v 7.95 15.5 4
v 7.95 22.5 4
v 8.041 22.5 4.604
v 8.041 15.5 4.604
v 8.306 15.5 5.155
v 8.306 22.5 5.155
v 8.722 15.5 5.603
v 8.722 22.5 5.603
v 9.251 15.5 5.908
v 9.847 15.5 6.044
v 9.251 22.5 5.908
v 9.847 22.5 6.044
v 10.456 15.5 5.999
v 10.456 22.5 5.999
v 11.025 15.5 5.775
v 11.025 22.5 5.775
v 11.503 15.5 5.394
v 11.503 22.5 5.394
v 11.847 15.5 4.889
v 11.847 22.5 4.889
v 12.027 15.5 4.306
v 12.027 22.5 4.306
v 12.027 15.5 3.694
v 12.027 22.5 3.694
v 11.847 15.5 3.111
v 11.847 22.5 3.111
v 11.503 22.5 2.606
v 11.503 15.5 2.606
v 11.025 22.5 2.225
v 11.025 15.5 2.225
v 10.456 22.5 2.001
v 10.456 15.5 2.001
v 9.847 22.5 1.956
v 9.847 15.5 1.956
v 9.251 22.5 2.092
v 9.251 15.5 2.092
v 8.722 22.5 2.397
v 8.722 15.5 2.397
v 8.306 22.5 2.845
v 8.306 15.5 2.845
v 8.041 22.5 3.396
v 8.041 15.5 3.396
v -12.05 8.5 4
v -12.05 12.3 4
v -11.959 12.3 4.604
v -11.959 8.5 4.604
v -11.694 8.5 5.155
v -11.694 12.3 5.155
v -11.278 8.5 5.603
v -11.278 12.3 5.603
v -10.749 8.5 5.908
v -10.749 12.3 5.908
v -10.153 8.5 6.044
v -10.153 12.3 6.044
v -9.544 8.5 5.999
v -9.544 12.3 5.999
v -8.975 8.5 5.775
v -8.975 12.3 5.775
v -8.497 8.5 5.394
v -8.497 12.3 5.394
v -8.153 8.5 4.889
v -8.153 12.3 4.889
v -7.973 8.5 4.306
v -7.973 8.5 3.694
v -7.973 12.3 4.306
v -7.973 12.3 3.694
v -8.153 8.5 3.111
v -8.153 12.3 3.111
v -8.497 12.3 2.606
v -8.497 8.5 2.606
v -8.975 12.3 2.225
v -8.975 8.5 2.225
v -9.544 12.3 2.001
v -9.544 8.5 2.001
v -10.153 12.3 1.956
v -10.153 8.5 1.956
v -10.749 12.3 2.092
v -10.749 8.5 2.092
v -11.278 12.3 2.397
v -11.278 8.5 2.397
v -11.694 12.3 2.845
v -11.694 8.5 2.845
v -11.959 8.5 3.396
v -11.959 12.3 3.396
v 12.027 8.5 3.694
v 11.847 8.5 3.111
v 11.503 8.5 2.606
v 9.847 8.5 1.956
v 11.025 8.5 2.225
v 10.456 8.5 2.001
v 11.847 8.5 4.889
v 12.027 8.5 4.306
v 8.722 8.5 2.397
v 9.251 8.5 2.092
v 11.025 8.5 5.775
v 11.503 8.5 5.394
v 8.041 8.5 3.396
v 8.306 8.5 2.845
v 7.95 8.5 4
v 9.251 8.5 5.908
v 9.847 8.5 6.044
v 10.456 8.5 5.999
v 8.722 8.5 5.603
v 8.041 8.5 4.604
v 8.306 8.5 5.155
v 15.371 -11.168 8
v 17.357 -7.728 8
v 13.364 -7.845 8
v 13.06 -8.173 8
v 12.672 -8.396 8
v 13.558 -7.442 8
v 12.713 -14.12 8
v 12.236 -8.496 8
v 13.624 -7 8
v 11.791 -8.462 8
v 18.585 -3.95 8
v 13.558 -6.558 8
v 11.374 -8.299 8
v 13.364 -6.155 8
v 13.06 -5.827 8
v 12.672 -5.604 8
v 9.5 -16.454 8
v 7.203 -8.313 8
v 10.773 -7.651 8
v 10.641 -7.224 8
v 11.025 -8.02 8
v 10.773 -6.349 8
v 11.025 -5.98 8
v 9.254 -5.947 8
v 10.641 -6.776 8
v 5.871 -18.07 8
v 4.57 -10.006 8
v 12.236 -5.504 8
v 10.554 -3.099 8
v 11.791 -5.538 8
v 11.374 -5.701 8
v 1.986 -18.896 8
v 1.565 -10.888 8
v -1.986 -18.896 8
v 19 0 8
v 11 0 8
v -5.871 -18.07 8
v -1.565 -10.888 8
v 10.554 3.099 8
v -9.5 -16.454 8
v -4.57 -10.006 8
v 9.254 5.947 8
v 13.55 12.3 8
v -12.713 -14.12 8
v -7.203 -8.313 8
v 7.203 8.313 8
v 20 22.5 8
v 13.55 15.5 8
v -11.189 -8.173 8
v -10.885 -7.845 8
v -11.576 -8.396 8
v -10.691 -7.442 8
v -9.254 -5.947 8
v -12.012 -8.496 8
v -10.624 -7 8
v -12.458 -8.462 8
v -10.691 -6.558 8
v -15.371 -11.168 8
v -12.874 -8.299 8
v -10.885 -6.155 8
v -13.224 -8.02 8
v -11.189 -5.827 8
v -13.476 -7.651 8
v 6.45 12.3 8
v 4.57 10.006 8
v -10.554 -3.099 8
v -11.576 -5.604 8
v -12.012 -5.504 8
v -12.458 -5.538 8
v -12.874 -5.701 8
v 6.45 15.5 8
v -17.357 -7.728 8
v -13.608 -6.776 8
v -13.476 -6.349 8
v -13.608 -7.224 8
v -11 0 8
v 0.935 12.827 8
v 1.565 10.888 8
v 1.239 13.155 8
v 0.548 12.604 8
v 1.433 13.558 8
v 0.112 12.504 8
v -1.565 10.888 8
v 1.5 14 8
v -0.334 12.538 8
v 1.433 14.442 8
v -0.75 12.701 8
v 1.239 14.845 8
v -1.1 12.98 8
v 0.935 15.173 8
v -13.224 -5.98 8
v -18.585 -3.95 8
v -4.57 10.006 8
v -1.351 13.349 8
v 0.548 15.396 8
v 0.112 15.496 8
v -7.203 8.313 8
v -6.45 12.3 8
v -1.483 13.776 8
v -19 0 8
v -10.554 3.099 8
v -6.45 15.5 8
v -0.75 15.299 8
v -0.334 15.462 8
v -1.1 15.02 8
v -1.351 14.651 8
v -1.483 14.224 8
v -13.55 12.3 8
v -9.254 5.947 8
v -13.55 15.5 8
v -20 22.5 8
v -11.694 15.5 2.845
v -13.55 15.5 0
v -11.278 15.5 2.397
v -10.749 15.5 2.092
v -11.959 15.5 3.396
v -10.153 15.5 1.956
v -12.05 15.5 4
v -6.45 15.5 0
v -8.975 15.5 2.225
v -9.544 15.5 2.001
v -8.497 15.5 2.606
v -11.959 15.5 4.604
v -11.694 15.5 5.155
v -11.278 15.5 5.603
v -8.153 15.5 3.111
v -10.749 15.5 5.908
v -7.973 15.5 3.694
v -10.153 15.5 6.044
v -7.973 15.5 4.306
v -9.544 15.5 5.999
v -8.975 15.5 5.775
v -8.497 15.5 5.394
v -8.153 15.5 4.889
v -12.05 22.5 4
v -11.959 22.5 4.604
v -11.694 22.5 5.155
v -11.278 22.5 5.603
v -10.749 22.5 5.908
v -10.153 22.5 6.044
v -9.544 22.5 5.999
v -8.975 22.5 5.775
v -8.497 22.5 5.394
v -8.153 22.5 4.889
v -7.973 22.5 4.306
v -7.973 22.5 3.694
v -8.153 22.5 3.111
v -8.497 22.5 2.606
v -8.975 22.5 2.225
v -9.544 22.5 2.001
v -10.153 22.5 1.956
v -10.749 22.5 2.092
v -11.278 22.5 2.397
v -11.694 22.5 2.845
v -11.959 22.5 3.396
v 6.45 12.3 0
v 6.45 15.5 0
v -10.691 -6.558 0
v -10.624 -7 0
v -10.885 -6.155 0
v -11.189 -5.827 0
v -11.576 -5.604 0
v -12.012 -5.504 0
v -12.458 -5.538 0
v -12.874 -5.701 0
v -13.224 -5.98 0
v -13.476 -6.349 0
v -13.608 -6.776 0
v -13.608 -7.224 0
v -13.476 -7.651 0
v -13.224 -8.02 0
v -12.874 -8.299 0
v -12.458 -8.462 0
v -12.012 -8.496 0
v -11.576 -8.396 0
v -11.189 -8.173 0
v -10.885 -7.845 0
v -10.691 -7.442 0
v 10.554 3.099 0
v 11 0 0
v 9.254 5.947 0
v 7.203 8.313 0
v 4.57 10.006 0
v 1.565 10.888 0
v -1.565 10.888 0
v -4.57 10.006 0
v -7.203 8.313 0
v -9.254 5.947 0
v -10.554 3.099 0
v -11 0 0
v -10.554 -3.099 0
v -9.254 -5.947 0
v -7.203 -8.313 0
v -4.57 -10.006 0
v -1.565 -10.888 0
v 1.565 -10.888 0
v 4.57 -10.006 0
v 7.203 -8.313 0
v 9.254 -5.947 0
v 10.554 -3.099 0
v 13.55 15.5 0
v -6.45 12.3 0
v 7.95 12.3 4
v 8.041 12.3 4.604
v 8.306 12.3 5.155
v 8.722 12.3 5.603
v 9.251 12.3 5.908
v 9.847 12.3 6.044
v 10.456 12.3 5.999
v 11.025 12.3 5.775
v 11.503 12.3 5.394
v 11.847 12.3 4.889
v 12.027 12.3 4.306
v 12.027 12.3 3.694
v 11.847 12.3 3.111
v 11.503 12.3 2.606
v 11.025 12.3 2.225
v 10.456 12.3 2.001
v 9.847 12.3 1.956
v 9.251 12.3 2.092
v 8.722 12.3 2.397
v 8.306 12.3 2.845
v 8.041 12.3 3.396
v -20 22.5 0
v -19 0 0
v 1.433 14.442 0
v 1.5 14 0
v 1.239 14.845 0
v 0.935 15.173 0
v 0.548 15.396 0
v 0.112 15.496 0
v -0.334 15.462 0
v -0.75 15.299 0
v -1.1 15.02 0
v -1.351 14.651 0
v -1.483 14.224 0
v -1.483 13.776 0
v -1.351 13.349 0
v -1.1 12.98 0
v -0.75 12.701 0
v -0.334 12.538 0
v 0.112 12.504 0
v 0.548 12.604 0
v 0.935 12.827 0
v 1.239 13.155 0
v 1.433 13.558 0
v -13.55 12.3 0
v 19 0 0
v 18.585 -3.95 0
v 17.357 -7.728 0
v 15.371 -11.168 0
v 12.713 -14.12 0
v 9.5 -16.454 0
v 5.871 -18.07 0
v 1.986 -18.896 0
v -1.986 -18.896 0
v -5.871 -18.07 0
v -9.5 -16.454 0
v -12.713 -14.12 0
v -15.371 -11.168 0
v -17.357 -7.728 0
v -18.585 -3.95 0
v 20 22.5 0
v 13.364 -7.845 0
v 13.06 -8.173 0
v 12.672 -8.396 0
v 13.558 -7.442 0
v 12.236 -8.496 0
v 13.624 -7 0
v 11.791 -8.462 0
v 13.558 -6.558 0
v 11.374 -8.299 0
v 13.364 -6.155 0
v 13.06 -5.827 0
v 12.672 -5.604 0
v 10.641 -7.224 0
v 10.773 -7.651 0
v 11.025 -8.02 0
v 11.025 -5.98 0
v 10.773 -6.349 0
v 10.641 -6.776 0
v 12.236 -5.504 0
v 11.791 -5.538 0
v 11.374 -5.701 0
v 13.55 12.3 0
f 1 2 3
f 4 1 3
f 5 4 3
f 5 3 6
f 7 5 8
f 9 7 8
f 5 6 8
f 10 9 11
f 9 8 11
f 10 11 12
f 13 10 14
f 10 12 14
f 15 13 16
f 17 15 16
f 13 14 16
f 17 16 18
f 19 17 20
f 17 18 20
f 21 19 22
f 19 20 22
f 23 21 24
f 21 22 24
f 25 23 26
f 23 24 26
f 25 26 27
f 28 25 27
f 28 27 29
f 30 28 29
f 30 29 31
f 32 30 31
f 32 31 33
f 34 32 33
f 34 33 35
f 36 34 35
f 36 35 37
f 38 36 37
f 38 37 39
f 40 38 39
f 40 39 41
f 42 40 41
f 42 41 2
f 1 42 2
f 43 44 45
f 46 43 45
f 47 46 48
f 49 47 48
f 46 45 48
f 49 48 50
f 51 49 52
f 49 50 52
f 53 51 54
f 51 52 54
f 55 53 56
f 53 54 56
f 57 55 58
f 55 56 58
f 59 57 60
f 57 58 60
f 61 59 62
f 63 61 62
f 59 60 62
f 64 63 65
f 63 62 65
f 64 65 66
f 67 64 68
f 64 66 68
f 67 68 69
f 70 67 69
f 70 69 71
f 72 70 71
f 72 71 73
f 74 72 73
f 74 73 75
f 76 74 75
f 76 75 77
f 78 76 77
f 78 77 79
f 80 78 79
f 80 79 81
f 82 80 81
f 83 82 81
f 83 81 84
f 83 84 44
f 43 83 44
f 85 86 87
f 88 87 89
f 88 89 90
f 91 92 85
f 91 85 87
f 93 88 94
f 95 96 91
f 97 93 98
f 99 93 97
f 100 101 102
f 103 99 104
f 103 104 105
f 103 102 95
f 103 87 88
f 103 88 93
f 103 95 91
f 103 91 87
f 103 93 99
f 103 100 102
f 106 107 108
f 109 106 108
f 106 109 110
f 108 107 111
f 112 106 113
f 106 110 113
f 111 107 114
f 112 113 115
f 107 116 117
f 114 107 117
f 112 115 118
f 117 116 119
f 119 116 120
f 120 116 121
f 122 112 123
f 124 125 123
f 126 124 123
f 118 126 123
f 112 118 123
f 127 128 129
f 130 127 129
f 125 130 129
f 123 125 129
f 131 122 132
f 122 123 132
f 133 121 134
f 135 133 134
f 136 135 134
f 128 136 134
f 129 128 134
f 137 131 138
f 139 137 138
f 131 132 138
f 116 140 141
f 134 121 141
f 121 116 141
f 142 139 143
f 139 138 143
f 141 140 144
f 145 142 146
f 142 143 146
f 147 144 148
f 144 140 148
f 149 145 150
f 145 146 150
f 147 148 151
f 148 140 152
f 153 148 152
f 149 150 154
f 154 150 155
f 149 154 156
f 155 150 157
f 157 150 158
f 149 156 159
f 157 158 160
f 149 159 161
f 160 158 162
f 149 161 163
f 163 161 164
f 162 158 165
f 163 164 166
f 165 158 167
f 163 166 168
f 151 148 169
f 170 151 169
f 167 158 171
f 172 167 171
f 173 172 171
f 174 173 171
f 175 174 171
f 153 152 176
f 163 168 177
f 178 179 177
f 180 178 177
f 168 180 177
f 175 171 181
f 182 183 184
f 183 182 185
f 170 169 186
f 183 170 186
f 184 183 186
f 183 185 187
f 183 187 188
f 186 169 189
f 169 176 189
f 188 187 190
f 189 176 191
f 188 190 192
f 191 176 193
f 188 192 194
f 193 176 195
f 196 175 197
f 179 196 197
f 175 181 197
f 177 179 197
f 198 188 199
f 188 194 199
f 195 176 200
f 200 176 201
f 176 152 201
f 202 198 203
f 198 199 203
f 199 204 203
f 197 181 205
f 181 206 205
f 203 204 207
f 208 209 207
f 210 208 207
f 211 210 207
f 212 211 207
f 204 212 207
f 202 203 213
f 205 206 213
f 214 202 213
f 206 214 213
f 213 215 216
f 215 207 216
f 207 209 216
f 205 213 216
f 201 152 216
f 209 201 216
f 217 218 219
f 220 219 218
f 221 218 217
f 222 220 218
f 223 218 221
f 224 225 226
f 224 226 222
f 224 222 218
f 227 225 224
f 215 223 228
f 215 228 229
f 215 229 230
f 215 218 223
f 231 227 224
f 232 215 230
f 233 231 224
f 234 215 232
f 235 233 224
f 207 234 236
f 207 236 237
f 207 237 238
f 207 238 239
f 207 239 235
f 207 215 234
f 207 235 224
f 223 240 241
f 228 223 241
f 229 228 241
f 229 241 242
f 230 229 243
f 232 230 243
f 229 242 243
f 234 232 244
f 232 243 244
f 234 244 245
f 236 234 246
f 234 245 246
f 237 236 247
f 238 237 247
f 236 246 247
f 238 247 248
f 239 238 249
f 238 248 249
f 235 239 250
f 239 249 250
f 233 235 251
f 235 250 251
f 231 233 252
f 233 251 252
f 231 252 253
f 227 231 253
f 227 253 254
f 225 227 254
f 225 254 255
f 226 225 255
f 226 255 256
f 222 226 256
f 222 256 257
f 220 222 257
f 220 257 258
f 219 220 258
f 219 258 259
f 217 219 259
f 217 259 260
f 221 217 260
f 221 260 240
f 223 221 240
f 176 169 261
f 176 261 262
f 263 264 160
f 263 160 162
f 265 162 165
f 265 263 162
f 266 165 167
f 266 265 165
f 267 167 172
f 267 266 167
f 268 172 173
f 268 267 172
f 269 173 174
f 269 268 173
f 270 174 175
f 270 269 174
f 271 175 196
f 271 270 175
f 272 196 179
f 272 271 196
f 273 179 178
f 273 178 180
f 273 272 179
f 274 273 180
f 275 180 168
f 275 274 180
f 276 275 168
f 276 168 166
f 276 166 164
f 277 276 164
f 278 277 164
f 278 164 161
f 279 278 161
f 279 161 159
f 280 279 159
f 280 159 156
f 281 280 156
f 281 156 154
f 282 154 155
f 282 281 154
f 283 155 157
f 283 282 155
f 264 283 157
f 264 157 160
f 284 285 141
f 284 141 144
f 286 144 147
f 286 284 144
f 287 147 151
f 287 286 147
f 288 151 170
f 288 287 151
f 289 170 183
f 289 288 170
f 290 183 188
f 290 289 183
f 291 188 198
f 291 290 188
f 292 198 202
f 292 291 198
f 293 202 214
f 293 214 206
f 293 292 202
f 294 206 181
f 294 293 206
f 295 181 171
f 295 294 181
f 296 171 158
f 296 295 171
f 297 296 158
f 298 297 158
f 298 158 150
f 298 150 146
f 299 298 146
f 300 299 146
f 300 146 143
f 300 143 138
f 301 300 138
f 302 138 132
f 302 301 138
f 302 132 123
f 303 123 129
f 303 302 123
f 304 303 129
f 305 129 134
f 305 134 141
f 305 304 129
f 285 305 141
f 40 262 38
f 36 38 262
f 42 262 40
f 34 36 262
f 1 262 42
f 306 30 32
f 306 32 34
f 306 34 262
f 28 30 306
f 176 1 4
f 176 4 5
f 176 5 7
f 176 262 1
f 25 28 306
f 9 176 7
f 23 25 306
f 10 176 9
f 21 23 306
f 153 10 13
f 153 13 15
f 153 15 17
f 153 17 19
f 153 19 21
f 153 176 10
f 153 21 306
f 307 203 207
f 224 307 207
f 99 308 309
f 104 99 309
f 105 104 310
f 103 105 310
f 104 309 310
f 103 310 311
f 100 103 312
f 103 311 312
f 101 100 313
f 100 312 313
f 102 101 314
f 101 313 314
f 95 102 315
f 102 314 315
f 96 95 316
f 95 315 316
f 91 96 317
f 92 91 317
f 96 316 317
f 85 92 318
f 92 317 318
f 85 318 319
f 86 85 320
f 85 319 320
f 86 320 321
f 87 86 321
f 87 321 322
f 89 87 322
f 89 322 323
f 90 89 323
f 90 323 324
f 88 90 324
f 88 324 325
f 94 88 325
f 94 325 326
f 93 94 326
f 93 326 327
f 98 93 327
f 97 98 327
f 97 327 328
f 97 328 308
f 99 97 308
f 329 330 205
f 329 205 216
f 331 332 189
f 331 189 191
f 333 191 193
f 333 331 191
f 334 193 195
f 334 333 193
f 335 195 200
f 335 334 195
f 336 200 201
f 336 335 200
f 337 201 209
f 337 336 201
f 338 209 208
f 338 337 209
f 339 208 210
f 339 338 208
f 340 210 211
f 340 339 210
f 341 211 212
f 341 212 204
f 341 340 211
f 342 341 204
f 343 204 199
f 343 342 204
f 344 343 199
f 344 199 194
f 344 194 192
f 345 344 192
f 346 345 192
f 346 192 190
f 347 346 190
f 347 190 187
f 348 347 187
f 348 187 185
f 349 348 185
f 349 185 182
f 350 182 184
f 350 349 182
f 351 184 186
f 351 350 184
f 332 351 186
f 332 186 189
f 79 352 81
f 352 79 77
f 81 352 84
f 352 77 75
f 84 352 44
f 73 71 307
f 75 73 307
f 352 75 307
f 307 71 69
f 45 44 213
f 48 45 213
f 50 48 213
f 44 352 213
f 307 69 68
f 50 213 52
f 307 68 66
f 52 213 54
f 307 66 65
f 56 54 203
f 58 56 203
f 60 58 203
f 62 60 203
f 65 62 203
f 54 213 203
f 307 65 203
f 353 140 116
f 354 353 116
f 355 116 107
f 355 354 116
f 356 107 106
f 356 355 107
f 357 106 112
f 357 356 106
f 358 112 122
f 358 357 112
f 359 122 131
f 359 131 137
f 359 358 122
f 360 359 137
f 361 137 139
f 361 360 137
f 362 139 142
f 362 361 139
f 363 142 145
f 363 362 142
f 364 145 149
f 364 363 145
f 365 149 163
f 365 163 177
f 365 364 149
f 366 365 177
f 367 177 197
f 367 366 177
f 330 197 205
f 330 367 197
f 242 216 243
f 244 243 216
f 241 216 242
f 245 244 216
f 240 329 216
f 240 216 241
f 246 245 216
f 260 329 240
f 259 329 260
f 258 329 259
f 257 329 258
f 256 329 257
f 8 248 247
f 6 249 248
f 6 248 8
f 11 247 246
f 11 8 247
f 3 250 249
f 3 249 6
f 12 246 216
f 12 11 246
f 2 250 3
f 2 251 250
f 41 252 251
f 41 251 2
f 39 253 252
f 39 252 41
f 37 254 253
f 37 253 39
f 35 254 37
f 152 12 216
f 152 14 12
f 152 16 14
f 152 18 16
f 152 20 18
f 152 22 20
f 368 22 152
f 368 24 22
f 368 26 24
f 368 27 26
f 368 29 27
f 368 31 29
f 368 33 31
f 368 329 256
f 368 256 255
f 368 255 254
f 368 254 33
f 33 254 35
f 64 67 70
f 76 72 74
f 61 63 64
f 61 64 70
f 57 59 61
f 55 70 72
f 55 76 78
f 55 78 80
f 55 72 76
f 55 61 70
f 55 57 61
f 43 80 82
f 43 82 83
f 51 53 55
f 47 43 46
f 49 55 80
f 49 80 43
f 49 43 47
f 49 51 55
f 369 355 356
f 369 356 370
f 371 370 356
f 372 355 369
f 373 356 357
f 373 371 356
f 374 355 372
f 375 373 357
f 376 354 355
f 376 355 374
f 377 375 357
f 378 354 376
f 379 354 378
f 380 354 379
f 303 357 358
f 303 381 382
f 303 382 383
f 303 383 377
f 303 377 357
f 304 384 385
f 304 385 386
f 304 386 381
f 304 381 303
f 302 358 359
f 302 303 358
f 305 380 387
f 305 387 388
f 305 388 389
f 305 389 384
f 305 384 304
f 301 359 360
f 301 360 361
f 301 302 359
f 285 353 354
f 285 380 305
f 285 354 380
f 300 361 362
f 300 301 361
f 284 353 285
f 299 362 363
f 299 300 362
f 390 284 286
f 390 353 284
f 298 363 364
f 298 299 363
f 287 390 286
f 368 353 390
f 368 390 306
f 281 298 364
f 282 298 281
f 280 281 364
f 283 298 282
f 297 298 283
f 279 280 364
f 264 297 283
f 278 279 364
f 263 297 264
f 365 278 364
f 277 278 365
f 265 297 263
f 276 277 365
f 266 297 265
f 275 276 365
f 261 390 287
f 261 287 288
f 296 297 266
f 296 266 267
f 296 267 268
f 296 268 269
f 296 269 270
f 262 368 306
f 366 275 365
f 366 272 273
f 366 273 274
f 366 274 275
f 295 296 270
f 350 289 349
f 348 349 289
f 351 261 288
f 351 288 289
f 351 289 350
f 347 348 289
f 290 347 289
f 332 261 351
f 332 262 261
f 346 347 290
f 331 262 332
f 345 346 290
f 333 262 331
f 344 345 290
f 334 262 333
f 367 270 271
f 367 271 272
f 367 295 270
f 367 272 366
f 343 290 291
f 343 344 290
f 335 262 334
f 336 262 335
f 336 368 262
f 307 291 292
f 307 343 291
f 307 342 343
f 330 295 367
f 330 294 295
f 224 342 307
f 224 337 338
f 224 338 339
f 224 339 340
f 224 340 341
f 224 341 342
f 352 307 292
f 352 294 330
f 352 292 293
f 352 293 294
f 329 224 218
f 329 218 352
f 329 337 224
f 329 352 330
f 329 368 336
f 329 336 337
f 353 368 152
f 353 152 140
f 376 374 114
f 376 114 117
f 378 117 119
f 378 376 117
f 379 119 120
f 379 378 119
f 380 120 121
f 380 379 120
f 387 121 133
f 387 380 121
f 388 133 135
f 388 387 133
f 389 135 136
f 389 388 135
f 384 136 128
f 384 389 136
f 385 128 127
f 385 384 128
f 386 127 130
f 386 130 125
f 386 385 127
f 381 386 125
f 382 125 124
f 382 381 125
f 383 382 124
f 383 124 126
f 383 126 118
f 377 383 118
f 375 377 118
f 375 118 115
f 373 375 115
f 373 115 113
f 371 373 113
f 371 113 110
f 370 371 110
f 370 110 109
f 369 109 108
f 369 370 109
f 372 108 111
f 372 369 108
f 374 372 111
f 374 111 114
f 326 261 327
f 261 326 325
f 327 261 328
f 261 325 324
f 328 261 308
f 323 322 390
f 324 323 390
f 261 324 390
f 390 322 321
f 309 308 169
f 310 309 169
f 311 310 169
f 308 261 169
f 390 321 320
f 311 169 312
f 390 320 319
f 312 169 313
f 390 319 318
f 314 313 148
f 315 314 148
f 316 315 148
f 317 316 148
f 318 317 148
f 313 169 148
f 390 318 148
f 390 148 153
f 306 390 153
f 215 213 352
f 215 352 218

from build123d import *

# Parameters (mm, degrees)
SKETCH1_R           = 1.5
SKETCH1_R_2         = 11
BOSS_EXTRUDE1_DEPTH = 8
SKETCH4_W           = 7.1
SKETCH4_H           = 3.2
CUT_EXTRUDE1_DEPTH  = 32.148836254
SKETCH5_R           = 2.05
CUT_EXTRUDE2_DEPTH  = 14


with BuildPart() as part:
    # Sketch1 → Boss-Extrude1 (new body)
    with BuildSketch(Plane.XY):
        with BuildLine():
            Line((-19, 0), (-20, 22.5))
            Line((-20, 22.5), (20, 22.5))
            Line((20, 22.5), (19, 0))
            ThreePointArc((19, 0), (0, -19), (-19, 0))
        make_face()
        with Locations((0, 14)):
            Circle(SKETCH1_R, mode=Mode.SUBTRACT)
        Circle(SKETCH1_R_2, mode=Mode.SUBTRACT)
        with Locations((12.124355653, -7)):
            Circle(SKETCH1_R, mode=Mode.SUBTRACT)
        with Locations((-12.124355653, -7)):
            Circle(SKETCH1_R, mode=Mode.SUBTRACT)
    extrude(amount=BOSS_EXTRUDE1_DEPTH)

    # Sketch4 → Cut-Extrude1 (cut, through all)
    with BuildSketch(Plane.XY.offset(8)):
        with Locations((-10, 13.9)):
            Rectangle(SKETCH4_W, SKETCH4_H)
        with Locations((10, 13.9)):
            Rectangle(SKETCH4_W, SKETCH4_H)
    extrude(amount=-CUT_EXTRUDE1_DEPTH, mode=Mode.SUBTRACT)

    # Sketch5 → Cut-Extrude2 (cut)
    with BuildSketch(Plane(origin=(0, 22.5, 0), x_dir=(1, 0, 0), z_dir=(0, 1, 0))):
        with Locations(Location((-10, -4, 0), (0, 0, 180))):
            Circle(SKETCH5_R)
        with Locations(Location((10, -4, 0), (0, 0, 180))):
            Circle(SKETCH5_R)
    extrude(amount=-CUT_EXTRUDE2_DEPTH, mode=Mode.SUBTRACT)


solid = part.part
